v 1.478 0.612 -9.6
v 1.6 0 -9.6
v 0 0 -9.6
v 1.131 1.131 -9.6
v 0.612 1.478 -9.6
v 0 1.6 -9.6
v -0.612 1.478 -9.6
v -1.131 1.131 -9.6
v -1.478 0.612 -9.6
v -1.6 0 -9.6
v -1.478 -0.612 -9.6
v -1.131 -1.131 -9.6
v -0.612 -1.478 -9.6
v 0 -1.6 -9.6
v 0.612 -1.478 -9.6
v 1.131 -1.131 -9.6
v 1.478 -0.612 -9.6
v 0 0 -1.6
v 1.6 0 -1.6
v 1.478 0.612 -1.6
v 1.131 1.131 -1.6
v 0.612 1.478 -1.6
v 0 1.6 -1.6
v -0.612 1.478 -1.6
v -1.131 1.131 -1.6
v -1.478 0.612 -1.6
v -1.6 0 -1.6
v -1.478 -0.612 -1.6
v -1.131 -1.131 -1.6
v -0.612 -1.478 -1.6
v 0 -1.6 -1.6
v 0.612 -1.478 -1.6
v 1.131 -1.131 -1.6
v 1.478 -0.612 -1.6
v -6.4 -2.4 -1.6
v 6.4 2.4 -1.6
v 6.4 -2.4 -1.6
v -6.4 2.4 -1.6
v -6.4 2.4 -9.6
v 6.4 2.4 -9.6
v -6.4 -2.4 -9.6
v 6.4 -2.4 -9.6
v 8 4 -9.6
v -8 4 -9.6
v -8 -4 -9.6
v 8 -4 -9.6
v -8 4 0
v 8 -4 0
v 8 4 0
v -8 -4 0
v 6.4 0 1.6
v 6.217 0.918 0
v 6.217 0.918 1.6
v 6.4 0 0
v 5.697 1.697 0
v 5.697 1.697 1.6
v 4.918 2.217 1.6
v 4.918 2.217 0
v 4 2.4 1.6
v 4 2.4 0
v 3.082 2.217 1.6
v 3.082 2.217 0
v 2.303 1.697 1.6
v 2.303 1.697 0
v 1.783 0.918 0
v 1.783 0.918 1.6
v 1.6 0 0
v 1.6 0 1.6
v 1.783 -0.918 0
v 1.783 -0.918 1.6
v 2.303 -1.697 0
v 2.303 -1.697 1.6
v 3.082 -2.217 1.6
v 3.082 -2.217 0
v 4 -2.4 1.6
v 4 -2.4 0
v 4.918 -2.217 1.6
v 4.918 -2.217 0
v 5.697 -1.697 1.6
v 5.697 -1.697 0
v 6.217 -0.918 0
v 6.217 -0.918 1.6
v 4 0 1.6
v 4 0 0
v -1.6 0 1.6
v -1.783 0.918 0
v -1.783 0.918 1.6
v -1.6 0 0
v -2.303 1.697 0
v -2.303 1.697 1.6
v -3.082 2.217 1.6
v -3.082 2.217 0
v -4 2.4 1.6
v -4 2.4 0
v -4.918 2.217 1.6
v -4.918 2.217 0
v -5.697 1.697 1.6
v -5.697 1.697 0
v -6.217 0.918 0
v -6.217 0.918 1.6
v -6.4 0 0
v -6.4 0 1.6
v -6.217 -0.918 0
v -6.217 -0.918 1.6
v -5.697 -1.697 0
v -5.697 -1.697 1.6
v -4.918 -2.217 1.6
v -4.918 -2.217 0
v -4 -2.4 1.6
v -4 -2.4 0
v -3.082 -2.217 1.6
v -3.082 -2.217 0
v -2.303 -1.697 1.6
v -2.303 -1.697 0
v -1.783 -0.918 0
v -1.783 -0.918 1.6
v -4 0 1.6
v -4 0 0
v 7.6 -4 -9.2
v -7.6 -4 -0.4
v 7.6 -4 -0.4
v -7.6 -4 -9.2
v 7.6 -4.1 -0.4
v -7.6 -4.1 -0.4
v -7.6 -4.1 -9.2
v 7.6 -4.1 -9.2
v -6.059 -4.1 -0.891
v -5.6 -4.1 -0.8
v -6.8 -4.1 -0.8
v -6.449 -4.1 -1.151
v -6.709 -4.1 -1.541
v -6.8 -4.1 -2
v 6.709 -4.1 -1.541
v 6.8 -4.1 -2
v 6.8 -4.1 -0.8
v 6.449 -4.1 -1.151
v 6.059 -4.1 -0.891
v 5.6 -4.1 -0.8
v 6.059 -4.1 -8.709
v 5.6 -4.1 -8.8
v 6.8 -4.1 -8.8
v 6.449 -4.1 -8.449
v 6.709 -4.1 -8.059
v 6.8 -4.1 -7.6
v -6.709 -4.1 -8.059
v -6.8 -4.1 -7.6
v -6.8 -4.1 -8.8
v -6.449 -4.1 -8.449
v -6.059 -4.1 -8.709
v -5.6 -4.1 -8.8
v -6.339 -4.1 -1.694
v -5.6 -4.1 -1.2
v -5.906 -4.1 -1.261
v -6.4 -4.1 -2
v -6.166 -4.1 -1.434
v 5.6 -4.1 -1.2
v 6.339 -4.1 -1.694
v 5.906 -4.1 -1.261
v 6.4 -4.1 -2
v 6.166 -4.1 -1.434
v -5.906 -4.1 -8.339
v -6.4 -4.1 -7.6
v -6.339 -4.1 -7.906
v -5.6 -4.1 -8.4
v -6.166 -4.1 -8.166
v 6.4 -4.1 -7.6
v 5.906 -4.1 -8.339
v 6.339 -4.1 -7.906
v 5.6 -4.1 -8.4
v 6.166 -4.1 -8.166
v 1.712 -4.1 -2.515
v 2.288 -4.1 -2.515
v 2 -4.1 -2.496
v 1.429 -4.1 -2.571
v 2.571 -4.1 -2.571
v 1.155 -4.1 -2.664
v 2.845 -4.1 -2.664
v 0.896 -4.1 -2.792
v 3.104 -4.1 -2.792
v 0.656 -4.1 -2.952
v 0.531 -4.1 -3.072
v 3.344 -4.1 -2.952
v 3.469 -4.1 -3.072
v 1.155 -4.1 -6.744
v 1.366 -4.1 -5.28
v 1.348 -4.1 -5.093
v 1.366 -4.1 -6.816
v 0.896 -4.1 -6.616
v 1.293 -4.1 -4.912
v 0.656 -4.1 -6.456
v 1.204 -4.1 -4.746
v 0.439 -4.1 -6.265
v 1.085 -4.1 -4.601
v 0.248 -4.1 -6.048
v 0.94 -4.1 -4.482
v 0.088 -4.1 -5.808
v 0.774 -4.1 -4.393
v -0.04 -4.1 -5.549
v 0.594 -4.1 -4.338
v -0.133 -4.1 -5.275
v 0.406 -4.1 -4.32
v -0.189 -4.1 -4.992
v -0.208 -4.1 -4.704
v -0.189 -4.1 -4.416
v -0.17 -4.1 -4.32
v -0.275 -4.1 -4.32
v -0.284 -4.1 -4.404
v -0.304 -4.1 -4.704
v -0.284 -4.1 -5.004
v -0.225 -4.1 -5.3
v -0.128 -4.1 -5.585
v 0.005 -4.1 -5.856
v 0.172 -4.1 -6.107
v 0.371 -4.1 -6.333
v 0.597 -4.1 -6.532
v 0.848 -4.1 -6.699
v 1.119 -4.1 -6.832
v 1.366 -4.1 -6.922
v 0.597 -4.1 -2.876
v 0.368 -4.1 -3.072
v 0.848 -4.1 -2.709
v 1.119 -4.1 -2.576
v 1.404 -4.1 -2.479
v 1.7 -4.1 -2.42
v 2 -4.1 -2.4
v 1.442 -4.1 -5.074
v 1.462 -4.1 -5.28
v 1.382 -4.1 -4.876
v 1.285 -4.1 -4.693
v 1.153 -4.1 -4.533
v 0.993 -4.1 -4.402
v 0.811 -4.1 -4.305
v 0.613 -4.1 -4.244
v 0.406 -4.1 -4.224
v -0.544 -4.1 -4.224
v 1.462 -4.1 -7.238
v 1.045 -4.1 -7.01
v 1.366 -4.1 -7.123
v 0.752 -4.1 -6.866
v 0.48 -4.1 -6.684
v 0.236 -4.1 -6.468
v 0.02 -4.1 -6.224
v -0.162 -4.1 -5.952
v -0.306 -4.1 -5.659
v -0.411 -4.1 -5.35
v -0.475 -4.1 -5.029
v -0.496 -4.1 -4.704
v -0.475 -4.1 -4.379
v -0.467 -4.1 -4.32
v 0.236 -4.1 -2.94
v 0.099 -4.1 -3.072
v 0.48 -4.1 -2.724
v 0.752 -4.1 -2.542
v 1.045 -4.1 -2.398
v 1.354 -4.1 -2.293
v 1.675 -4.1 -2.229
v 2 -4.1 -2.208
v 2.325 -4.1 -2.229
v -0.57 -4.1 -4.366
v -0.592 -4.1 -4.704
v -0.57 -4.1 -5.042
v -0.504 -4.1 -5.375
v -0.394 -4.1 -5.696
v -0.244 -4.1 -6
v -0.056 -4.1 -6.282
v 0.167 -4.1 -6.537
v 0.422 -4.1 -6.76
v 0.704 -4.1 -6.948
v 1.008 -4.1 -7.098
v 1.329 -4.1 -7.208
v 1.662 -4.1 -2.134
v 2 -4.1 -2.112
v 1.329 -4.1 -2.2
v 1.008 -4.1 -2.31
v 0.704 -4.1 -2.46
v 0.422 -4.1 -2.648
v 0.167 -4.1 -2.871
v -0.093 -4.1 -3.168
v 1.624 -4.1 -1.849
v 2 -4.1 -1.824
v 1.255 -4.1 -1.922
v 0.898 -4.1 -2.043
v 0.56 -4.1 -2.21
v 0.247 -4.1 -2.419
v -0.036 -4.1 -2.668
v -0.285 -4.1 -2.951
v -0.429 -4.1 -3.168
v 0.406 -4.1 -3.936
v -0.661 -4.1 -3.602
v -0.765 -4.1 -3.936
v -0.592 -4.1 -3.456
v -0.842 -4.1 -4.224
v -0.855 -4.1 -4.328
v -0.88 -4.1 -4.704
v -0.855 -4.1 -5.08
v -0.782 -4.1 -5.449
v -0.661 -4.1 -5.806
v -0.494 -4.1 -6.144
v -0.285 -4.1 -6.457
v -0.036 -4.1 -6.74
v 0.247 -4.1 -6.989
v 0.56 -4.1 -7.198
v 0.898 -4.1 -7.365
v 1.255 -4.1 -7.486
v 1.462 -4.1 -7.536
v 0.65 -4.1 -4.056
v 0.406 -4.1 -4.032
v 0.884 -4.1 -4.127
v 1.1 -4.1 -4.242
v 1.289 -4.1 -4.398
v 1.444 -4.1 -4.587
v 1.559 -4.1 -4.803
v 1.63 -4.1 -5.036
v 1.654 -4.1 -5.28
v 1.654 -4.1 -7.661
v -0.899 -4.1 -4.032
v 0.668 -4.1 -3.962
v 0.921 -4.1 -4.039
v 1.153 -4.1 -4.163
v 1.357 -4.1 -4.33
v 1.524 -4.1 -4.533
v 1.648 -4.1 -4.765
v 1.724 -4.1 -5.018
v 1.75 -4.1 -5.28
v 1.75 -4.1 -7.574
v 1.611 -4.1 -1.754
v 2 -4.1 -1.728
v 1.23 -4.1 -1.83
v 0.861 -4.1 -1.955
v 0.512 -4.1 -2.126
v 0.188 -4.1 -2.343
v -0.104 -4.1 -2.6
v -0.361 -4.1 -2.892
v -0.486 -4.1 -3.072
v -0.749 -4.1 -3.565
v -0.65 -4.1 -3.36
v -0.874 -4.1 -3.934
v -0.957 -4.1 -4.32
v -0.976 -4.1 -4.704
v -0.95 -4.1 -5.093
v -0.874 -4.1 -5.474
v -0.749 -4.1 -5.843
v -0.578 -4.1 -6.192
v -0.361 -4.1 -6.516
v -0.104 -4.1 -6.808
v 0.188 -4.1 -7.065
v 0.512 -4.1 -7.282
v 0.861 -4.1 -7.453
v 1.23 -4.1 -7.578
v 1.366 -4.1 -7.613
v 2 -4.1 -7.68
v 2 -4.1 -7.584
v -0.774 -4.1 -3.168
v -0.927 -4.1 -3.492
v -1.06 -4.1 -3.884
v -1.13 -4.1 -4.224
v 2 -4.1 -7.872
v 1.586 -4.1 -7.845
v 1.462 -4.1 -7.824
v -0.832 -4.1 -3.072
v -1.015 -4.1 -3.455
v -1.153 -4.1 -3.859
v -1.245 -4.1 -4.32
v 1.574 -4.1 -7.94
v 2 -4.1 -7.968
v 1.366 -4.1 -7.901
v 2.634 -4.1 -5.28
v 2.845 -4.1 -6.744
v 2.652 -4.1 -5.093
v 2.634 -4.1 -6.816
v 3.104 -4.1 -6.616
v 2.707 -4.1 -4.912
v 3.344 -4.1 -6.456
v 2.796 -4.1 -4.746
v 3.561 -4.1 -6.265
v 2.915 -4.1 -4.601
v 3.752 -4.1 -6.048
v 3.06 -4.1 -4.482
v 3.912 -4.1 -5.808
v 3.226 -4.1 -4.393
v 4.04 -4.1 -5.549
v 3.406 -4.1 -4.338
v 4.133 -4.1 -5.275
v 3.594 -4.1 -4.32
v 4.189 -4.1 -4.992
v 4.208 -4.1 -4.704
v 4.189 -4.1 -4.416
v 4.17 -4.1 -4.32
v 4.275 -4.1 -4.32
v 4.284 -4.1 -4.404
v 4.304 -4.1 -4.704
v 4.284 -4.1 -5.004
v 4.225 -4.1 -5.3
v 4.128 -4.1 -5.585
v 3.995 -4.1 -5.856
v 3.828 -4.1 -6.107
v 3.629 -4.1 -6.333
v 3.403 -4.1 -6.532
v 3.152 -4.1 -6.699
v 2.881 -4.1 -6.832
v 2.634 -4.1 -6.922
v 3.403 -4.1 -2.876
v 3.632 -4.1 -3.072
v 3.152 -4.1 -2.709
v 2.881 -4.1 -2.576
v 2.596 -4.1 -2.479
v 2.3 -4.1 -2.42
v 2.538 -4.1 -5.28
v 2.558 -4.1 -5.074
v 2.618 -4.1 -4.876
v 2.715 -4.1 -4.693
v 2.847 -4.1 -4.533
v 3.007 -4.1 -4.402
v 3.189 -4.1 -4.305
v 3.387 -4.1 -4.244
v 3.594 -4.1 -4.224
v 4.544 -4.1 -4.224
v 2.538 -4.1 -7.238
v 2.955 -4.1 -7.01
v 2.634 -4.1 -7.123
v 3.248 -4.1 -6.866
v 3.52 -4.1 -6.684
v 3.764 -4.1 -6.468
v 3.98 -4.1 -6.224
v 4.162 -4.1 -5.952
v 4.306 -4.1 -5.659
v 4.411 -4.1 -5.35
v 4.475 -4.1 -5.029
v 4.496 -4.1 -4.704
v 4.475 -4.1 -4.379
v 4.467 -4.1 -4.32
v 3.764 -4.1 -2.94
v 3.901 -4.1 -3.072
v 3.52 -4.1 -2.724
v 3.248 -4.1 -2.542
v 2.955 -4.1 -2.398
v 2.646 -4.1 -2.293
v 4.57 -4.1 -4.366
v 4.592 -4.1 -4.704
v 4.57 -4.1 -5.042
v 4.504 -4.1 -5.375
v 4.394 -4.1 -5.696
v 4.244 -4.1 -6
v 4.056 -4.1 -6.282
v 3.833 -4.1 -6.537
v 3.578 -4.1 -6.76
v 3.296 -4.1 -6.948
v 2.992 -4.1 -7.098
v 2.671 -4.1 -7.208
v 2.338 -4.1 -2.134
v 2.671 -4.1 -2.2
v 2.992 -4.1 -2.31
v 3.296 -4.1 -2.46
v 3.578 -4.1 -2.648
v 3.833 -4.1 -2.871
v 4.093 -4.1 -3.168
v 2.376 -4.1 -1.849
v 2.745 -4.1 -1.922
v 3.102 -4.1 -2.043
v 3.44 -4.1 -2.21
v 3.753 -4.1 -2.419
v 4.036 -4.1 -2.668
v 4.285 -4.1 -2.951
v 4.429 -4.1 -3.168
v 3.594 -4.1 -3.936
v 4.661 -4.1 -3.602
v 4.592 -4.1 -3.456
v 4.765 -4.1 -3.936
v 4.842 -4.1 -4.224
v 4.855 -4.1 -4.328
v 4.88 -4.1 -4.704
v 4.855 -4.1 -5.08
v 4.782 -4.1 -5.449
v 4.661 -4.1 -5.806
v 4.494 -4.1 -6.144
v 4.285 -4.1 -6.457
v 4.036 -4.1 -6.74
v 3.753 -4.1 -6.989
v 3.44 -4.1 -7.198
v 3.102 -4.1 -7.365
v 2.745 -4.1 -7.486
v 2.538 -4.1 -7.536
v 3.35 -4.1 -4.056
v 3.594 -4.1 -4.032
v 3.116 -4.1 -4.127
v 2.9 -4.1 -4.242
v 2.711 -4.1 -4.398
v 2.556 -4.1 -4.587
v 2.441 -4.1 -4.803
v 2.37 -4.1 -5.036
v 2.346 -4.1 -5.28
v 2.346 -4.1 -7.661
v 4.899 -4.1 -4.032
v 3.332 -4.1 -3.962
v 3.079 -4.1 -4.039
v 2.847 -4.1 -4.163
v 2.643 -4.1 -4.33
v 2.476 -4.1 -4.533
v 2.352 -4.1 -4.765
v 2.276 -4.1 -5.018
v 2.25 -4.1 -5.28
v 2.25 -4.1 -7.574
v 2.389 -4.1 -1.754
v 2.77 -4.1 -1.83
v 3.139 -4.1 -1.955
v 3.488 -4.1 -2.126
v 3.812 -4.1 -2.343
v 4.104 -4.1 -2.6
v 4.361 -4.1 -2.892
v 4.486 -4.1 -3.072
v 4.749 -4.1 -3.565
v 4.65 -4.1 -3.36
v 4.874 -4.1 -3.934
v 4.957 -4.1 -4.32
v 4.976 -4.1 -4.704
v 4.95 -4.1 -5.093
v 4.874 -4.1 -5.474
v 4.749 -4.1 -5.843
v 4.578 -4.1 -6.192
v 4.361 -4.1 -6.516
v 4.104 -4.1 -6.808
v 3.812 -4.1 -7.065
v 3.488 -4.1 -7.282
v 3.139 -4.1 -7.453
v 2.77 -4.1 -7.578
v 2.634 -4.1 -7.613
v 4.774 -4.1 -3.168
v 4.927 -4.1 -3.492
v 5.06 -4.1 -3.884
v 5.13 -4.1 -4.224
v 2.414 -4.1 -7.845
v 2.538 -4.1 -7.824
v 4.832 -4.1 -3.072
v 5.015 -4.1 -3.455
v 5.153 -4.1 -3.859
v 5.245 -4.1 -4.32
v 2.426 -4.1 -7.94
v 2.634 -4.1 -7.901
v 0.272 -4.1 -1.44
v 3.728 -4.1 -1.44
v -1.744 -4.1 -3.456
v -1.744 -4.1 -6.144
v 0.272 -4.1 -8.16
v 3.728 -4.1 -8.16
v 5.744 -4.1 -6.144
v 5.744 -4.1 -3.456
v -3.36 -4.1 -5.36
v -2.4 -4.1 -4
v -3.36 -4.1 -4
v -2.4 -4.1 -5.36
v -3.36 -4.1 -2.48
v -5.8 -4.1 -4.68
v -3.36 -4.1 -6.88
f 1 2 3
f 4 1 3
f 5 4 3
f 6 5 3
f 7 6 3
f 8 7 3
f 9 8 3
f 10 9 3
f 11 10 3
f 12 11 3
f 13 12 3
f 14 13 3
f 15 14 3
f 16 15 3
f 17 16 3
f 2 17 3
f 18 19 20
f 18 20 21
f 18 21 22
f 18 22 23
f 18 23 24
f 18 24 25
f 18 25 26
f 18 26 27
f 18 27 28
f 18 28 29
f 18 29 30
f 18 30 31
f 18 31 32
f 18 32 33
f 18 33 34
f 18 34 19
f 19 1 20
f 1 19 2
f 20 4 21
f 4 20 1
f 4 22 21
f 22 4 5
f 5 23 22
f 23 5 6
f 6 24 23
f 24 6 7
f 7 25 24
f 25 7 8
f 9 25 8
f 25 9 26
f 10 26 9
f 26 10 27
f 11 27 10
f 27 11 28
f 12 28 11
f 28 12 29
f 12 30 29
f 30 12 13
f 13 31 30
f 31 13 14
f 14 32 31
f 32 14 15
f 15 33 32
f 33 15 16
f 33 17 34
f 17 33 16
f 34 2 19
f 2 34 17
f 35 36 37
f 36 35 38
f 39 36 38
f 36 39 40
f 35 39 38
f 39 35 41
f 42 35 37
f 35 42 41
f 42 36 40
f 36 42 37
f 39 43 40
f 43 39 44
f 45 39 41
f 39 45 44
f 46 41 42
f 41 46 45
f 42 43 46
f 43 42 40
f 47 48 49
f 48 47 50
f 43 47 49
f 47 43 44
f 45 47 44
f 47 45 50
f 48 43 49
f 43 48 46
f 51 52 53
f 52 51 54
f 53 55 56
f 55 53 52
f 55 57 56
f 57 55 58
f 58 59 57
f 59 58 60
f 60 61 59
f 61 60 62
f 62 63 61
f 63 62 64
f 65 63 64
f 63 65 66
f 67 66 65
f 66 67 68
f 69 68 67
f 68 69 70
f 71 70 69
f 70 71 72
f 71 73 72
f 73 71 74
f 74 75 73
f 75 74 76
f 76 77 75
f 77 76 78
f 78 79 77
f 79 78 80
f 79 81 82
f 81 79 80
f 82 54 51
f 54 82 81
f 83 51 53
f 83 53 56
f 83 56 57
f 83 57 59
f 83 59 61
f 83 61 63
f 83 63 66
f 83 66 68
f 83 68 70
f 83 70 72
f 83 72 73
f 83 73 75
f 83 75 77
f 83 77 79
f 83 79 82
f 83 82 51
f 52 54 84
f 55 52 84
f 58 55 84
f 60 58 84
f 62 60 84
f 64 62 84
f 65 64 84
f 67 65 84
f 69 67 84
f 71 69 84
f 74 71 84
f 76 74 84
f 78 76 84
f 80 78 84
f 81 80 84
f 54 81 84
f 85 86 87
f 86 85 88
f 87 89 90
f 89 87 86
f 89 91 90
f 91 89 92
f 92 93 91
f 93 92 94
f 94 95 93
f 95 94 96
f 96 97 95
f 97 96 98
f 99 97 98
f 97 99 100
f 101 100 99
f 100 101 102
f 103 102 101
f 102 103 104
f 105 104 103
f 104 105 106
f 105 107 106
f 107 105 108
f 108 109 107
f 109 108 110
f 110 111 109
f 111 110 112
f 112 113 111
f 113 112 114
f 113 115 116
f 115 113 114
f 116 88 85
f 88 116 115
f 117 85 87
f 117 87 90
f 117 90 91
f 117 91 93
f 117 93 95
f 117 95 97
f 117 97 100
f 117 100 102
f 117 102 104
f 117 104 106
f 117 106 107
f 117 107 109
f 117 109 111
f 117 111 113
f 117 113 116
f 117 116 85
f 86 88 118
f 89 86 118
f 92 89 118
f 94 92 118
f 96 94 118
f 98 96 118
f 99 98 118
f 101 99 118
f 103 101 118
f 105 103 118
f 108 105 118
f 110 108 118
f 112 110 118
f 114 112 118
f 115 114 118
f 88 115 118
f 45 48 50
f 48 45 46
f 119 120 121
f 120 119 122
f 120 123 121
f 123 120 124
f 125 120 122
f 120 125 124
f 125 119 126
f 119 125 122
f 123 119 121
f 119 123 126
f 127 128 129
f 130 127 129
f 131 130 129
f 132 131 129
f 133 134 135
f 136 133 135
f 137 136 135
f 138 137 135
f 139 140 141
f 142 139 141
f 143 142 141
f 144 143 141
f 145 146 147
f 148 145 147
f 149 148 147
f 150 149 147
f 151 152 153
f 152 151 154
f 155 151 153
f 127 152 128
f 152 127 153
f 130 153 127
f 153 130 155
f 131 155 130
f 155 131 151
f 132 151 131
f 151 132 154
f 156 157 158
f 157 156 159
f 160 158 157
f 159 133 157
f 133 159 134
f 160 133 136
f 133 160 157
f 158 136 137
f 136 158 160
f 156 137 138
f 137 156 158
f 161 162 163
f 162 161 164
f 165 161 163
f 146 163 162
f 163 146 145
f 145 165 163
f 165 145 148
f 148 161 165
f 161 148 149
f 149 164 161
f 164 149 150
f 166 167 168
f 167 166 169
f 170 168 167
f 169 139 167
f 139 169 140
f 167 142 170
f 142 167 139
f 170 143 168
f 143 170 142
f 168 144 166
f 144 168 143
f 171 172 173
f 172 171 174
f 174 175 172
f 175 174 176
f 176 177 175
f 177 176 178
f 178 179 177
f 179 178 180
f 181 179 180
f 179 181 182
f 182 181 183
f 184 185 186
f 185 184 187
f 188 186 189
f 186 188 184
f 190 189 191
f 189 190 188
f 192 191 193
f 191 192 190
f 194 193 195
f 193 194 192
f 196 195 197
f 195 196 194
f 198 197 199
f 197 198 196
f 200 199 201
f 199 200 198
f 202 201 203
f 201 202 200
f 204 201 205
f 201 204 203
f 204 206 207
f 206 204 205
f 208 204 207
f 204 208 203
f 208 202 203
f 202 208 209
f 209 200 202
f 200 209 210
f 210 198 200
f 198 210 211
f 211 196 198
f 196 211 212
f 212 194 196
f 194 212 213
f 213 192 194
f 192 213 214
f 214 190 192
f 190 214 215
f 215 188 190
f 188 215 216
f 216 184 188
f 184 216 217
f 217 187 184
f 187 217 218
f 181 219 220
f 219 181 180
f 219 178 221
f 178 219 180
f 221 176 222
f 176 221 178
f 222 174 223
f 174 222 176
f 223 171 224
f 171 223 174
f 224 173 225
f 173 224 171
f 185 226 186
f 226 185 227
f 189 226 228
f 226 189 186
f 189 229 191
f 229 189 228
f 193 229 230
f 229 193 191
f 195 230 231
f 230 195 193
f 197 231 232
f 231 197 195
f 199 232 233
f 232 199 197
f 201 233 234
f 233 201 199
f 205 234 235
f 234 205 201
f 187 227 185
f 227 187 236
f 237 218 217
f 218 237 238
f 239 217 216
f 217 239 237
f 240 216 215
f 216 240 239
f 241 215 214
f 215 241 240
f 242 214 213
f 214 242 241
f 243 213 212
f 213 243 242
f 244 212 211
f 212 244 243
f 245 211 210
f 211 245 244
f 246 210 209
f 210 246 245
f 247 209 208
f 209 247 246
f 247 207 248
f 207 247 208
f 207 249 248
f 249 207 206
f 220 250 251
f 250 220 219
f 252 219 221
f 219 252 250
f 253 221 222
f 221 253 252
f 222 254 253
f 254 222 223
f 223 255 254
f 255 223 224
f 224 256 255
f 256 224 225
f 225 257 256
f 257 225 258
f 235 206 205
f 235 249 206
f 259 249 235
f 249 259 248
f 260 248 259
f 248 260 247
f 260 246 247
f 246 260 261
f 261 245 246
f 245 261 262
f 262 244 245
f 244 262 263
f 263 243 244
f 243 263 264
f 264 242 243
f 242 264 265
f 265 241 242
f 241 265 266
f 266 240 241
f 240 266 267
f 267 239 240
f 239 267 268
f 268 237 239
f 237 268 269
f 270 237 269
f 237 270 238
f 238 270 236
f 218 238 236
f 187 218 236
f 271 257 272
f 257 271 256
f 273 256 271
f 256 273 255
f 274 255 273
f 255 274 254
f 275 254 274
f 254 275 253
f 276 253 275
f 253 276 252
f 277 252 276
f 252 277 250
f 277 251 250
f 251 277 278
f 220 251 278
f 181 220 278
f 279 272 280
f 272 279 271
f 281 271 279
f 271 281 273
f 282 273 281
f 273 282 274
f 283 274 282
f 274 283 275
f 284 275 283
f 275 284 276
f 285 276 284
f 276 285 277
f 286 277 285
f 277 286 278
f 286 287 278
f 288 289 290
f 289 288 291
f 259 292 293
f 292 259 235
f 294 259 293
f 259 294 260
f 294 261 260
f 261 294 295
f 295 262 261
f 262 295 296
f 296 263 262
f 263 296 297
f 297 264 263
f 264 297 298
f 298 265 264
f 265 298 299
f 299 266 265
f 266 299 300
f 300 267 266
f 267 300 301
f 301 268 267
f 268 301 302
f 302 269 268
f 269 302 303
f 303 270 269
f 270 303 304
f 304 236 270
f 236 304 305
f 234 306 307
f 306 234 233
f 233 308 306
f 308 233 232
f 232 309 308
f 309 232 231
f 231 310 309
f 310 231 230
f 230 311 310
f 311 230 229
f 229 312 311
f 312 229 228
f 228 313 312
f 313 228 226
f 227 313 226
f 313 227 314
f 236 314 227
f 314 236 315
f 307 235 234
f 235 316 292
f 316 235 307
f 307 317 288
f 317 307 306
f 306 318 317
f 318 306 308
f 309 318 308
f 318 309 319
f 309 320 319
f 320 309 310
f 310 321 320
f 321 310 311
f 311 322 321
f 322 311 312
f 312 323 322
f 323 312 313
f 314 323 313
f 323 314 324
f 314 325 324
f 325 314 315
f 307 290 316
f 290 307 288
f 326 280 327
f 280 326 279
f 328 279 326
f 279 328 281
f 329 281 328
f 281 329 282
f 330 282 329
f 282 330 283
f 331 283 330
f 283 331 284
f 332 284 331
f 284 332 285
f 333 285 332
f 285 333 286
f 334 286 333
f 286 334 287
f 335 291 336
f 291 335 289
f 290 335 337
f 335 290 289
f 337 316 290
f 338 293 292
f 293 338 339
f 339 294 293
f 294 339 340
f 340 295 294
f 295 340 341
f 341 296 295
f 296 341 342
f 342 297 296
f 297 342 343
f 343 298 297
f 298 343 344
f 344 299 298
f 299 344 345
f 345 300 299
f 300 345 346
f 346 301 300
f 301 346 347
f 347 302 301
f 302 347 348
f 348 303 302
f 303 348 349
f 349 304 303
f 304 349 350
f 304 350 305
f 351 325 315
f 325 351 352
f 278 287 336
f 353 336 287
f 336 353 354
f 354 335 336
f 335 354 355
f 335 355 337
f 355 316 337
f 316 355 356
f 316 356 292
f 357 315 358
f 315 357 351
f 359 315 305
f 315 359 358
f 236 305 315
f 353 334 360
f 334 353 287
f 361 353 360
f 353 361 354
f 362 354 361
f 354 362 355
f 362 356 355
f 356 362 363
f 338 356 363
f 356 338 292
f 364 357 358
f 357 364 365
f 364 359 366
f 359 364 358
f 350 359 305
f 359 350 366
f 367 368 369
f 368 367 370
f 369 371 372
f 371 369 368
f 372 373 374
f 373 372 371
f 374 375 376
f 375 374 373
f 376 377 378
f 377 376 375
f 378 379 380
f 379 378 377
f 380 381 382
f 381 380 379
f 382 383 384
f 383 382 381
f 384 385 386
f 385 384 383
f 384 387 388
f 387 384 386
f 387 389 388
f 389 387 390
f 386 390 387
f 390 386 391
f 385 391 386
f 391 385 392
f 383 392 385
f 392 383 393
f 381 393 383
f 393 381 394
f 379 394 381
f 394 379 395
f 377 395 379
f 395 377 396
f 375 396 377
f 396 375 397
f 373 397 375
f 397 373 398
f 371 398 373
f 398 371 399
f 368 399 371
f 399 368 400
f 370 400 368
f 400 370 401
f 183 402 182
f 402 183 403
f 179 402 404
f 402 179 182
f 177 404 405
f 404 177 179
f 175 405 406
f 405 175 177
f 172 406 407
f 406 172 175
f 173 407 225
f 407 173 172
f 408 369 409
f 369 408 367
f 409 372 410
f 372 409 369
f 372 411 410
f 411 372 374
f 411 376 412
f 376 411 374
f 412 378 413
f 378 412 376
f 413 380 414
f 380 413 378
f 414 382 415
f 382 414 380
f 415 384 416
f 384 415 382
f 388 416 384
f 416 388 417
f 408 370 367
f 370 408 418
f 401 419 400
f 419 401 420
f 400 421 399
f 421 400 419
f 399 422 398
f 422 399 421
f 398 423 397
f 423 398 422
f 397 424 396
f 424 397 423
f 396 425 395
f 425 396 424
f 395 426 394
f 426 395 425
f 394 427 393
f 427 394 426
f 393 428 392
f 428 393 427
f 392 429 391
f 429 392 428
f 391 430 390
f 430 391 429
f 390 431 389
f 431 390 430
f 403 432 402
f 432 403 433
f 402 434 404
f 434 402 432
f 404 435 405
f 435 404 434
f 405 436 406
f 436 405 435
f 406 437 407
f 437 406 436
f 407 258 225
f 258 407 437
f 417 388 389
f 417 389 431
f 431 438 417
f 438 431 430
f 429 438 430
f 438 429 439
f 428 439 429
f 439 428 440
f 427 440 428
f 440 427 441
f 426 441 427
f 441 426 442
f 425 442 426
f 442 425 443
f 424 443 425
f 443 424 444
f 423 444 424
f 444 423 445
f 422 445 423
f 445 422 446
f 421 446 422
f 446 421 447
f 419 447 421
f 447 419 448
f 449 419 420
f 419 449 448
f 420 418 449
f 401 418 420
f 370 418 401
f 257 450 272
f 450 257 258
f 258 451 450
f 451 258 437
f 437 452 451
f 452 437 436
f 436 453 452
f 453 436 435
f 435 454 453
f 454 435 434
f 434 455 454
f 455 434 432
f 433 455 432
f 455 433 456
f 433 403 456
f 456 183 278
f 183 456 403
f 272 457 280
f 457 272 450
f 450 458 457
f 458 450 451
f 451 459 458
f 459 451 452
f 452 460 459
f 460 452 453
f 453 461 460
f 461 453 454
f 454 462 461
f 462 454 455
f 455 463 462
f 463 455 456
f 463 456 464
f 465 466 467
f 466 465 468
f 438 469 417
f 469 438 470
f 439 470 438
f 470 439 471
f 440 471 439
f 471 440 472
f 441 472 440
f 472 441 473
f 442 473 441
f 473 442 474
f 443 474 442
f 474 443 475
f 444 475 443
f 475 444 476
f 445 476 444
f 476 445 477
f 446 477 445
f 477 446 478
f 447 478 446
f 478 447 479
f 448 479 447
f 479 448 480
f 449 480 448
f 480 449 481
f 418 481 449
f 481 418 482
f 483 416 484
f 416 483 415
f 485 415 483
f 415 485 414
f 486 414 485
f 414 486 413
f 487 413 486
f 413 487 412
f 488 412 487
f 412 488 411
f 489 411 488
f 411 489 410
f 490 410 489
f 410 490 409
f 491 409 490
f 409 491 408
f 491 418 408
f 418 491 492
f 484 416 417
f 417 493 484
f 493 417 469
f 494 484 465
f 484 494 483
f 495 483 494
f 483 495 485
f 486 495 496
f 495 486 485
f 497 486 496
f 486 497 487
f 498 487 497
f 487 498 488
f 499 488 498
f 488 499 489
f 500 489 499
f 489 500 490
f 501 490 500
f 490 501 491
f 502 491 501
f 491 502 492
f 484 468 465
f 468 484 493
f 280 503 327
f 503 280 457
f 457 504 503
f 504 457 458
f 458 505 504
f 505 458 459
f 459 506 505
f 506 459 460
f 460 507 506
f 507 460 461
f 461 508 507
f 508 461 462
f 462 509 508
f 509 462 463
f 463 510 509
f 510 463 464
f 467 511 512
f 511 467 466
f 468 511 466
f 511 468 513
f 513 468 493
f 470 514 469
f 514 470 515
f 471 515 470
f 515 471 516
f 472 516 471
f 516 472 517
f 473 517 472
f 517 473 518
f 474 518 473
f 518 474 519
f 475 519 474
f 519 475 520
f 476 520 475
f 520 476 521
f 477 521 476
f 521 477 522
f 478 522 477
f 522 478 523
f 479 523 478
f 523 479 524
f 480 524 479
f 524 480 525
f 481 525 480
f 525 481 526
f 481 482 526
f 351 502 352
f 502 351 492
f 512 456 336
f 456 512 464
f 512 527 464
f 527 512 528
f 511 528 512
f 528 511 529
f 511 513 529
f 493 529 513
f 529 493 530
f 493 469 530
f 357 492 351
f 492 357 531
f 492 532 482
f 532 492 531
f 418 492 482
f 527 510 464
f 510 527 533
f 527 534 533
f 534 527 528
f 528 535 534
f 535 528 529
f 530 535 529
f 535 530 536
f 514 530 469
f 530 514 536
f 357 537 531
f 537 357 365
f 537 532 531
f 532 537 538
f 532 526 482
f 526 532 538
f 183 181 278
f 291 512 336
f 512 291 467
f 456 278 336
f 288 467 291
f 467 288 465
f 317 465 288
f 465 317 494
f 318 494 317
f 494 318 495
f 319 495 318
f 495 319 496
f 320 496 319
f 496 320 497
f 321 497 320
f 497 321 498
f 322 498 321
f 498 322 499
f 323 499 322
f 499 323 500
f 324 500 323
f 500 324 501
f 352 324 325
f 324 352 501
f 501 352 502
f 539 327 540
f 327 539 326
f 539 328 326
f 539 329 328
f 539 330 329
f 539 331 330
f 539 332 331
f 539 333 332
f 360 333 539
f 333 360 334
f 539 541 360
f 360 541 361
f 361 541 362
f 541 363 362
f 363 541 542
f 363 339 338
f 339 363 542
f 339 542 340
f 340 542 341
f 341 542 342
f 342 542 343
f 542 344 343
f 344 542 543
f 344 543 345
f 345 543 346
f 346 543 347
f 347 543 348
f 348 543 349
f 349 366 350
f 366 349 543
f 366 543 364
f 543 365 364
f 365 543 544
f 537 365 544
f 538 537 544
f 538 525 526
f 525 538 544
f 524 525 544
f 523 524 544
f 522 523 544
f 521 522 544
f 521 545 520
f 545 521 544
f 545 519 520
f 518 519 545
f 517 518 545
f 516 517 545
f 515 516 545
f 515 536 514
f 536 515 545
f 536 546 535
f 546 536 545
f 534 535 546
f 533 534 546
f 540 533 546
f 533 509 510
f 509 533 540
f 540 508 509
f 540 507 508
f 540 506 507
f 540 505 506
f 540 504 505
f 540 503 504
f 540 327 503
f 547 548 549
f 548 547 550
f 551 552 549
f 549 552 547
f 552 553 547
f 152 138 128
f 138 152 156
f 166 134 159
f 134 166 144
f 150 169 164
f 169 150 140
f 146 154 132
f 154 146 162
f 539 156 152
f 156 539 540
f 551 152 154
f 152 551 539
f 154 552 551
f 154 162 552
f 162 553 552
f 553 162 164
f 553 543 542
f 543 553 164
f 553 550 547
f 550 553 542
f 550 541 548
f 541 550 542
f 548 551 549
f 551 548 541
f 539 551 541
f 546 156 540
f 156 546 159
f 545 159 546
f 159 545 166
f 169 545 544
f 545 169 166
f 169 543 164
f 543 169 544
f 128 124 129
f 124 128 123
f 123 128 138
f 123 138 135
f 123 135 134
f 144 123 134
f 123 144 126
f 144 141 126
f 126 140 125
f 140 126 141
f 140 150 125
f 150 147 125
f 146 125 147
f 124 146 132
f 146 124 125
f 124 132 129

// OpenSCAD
use <../lib.scad>
use <163555h.scad>
use <3004.scad>
function ldraw_lib__3004d0z() = [
// 0 Brick  1 x  2 with Monorail Station Direction Signs Left Sticker
// 0 Name: 3004d0z.dat
// 0 Author: Takeshi Takahashi [RainbowDolphin]
// 0 !LDRAW_ORG Shortcut UPDATE 2024-07
// 0 !LICENSE Licensed under CC BY 4.0 : see CAreadme.txt
// 
// 0 BFC CERTIFY CCW
  [0,"BFC","CERTIFY"],
  [0,"BFC","CCW"],
// 
// 0 !CATEGORY Sticker Shortcut
// 0 !KEYWORDS Airport Shuttle, Bricklink 3004pb021L, set 6399
// 
// 0 !HISTORY 2024-08-26 [OrionP] Official Update 2024-07
// 
// 1 16 0 0 0 1 0 0 0 1 0 0 0 1 3004.dat
  [1,16,0,0,0,1,0,0,0,1,0,0,0,1, ldraw_lib__3004()],
// 1 16 0 12 -10 1 0 0 0 0 -1 0 1 0 163555h.dat
  [1,16,0,12,-10,1,0,0,0,0,-1,0,1,0, ldraw_lib__163555h()],
];
module ldraw_lib__3004d0z(step=0, col=false, unit=2/5, alt=false, line=0.2, solid=!$preview)
    makepoly(ldraw_lib__3004d0z(), step=step, col=col, unit=unit, alt=alt, line=line, solid=solid);
ldraw_lib__3004d0z(line=0.2);
